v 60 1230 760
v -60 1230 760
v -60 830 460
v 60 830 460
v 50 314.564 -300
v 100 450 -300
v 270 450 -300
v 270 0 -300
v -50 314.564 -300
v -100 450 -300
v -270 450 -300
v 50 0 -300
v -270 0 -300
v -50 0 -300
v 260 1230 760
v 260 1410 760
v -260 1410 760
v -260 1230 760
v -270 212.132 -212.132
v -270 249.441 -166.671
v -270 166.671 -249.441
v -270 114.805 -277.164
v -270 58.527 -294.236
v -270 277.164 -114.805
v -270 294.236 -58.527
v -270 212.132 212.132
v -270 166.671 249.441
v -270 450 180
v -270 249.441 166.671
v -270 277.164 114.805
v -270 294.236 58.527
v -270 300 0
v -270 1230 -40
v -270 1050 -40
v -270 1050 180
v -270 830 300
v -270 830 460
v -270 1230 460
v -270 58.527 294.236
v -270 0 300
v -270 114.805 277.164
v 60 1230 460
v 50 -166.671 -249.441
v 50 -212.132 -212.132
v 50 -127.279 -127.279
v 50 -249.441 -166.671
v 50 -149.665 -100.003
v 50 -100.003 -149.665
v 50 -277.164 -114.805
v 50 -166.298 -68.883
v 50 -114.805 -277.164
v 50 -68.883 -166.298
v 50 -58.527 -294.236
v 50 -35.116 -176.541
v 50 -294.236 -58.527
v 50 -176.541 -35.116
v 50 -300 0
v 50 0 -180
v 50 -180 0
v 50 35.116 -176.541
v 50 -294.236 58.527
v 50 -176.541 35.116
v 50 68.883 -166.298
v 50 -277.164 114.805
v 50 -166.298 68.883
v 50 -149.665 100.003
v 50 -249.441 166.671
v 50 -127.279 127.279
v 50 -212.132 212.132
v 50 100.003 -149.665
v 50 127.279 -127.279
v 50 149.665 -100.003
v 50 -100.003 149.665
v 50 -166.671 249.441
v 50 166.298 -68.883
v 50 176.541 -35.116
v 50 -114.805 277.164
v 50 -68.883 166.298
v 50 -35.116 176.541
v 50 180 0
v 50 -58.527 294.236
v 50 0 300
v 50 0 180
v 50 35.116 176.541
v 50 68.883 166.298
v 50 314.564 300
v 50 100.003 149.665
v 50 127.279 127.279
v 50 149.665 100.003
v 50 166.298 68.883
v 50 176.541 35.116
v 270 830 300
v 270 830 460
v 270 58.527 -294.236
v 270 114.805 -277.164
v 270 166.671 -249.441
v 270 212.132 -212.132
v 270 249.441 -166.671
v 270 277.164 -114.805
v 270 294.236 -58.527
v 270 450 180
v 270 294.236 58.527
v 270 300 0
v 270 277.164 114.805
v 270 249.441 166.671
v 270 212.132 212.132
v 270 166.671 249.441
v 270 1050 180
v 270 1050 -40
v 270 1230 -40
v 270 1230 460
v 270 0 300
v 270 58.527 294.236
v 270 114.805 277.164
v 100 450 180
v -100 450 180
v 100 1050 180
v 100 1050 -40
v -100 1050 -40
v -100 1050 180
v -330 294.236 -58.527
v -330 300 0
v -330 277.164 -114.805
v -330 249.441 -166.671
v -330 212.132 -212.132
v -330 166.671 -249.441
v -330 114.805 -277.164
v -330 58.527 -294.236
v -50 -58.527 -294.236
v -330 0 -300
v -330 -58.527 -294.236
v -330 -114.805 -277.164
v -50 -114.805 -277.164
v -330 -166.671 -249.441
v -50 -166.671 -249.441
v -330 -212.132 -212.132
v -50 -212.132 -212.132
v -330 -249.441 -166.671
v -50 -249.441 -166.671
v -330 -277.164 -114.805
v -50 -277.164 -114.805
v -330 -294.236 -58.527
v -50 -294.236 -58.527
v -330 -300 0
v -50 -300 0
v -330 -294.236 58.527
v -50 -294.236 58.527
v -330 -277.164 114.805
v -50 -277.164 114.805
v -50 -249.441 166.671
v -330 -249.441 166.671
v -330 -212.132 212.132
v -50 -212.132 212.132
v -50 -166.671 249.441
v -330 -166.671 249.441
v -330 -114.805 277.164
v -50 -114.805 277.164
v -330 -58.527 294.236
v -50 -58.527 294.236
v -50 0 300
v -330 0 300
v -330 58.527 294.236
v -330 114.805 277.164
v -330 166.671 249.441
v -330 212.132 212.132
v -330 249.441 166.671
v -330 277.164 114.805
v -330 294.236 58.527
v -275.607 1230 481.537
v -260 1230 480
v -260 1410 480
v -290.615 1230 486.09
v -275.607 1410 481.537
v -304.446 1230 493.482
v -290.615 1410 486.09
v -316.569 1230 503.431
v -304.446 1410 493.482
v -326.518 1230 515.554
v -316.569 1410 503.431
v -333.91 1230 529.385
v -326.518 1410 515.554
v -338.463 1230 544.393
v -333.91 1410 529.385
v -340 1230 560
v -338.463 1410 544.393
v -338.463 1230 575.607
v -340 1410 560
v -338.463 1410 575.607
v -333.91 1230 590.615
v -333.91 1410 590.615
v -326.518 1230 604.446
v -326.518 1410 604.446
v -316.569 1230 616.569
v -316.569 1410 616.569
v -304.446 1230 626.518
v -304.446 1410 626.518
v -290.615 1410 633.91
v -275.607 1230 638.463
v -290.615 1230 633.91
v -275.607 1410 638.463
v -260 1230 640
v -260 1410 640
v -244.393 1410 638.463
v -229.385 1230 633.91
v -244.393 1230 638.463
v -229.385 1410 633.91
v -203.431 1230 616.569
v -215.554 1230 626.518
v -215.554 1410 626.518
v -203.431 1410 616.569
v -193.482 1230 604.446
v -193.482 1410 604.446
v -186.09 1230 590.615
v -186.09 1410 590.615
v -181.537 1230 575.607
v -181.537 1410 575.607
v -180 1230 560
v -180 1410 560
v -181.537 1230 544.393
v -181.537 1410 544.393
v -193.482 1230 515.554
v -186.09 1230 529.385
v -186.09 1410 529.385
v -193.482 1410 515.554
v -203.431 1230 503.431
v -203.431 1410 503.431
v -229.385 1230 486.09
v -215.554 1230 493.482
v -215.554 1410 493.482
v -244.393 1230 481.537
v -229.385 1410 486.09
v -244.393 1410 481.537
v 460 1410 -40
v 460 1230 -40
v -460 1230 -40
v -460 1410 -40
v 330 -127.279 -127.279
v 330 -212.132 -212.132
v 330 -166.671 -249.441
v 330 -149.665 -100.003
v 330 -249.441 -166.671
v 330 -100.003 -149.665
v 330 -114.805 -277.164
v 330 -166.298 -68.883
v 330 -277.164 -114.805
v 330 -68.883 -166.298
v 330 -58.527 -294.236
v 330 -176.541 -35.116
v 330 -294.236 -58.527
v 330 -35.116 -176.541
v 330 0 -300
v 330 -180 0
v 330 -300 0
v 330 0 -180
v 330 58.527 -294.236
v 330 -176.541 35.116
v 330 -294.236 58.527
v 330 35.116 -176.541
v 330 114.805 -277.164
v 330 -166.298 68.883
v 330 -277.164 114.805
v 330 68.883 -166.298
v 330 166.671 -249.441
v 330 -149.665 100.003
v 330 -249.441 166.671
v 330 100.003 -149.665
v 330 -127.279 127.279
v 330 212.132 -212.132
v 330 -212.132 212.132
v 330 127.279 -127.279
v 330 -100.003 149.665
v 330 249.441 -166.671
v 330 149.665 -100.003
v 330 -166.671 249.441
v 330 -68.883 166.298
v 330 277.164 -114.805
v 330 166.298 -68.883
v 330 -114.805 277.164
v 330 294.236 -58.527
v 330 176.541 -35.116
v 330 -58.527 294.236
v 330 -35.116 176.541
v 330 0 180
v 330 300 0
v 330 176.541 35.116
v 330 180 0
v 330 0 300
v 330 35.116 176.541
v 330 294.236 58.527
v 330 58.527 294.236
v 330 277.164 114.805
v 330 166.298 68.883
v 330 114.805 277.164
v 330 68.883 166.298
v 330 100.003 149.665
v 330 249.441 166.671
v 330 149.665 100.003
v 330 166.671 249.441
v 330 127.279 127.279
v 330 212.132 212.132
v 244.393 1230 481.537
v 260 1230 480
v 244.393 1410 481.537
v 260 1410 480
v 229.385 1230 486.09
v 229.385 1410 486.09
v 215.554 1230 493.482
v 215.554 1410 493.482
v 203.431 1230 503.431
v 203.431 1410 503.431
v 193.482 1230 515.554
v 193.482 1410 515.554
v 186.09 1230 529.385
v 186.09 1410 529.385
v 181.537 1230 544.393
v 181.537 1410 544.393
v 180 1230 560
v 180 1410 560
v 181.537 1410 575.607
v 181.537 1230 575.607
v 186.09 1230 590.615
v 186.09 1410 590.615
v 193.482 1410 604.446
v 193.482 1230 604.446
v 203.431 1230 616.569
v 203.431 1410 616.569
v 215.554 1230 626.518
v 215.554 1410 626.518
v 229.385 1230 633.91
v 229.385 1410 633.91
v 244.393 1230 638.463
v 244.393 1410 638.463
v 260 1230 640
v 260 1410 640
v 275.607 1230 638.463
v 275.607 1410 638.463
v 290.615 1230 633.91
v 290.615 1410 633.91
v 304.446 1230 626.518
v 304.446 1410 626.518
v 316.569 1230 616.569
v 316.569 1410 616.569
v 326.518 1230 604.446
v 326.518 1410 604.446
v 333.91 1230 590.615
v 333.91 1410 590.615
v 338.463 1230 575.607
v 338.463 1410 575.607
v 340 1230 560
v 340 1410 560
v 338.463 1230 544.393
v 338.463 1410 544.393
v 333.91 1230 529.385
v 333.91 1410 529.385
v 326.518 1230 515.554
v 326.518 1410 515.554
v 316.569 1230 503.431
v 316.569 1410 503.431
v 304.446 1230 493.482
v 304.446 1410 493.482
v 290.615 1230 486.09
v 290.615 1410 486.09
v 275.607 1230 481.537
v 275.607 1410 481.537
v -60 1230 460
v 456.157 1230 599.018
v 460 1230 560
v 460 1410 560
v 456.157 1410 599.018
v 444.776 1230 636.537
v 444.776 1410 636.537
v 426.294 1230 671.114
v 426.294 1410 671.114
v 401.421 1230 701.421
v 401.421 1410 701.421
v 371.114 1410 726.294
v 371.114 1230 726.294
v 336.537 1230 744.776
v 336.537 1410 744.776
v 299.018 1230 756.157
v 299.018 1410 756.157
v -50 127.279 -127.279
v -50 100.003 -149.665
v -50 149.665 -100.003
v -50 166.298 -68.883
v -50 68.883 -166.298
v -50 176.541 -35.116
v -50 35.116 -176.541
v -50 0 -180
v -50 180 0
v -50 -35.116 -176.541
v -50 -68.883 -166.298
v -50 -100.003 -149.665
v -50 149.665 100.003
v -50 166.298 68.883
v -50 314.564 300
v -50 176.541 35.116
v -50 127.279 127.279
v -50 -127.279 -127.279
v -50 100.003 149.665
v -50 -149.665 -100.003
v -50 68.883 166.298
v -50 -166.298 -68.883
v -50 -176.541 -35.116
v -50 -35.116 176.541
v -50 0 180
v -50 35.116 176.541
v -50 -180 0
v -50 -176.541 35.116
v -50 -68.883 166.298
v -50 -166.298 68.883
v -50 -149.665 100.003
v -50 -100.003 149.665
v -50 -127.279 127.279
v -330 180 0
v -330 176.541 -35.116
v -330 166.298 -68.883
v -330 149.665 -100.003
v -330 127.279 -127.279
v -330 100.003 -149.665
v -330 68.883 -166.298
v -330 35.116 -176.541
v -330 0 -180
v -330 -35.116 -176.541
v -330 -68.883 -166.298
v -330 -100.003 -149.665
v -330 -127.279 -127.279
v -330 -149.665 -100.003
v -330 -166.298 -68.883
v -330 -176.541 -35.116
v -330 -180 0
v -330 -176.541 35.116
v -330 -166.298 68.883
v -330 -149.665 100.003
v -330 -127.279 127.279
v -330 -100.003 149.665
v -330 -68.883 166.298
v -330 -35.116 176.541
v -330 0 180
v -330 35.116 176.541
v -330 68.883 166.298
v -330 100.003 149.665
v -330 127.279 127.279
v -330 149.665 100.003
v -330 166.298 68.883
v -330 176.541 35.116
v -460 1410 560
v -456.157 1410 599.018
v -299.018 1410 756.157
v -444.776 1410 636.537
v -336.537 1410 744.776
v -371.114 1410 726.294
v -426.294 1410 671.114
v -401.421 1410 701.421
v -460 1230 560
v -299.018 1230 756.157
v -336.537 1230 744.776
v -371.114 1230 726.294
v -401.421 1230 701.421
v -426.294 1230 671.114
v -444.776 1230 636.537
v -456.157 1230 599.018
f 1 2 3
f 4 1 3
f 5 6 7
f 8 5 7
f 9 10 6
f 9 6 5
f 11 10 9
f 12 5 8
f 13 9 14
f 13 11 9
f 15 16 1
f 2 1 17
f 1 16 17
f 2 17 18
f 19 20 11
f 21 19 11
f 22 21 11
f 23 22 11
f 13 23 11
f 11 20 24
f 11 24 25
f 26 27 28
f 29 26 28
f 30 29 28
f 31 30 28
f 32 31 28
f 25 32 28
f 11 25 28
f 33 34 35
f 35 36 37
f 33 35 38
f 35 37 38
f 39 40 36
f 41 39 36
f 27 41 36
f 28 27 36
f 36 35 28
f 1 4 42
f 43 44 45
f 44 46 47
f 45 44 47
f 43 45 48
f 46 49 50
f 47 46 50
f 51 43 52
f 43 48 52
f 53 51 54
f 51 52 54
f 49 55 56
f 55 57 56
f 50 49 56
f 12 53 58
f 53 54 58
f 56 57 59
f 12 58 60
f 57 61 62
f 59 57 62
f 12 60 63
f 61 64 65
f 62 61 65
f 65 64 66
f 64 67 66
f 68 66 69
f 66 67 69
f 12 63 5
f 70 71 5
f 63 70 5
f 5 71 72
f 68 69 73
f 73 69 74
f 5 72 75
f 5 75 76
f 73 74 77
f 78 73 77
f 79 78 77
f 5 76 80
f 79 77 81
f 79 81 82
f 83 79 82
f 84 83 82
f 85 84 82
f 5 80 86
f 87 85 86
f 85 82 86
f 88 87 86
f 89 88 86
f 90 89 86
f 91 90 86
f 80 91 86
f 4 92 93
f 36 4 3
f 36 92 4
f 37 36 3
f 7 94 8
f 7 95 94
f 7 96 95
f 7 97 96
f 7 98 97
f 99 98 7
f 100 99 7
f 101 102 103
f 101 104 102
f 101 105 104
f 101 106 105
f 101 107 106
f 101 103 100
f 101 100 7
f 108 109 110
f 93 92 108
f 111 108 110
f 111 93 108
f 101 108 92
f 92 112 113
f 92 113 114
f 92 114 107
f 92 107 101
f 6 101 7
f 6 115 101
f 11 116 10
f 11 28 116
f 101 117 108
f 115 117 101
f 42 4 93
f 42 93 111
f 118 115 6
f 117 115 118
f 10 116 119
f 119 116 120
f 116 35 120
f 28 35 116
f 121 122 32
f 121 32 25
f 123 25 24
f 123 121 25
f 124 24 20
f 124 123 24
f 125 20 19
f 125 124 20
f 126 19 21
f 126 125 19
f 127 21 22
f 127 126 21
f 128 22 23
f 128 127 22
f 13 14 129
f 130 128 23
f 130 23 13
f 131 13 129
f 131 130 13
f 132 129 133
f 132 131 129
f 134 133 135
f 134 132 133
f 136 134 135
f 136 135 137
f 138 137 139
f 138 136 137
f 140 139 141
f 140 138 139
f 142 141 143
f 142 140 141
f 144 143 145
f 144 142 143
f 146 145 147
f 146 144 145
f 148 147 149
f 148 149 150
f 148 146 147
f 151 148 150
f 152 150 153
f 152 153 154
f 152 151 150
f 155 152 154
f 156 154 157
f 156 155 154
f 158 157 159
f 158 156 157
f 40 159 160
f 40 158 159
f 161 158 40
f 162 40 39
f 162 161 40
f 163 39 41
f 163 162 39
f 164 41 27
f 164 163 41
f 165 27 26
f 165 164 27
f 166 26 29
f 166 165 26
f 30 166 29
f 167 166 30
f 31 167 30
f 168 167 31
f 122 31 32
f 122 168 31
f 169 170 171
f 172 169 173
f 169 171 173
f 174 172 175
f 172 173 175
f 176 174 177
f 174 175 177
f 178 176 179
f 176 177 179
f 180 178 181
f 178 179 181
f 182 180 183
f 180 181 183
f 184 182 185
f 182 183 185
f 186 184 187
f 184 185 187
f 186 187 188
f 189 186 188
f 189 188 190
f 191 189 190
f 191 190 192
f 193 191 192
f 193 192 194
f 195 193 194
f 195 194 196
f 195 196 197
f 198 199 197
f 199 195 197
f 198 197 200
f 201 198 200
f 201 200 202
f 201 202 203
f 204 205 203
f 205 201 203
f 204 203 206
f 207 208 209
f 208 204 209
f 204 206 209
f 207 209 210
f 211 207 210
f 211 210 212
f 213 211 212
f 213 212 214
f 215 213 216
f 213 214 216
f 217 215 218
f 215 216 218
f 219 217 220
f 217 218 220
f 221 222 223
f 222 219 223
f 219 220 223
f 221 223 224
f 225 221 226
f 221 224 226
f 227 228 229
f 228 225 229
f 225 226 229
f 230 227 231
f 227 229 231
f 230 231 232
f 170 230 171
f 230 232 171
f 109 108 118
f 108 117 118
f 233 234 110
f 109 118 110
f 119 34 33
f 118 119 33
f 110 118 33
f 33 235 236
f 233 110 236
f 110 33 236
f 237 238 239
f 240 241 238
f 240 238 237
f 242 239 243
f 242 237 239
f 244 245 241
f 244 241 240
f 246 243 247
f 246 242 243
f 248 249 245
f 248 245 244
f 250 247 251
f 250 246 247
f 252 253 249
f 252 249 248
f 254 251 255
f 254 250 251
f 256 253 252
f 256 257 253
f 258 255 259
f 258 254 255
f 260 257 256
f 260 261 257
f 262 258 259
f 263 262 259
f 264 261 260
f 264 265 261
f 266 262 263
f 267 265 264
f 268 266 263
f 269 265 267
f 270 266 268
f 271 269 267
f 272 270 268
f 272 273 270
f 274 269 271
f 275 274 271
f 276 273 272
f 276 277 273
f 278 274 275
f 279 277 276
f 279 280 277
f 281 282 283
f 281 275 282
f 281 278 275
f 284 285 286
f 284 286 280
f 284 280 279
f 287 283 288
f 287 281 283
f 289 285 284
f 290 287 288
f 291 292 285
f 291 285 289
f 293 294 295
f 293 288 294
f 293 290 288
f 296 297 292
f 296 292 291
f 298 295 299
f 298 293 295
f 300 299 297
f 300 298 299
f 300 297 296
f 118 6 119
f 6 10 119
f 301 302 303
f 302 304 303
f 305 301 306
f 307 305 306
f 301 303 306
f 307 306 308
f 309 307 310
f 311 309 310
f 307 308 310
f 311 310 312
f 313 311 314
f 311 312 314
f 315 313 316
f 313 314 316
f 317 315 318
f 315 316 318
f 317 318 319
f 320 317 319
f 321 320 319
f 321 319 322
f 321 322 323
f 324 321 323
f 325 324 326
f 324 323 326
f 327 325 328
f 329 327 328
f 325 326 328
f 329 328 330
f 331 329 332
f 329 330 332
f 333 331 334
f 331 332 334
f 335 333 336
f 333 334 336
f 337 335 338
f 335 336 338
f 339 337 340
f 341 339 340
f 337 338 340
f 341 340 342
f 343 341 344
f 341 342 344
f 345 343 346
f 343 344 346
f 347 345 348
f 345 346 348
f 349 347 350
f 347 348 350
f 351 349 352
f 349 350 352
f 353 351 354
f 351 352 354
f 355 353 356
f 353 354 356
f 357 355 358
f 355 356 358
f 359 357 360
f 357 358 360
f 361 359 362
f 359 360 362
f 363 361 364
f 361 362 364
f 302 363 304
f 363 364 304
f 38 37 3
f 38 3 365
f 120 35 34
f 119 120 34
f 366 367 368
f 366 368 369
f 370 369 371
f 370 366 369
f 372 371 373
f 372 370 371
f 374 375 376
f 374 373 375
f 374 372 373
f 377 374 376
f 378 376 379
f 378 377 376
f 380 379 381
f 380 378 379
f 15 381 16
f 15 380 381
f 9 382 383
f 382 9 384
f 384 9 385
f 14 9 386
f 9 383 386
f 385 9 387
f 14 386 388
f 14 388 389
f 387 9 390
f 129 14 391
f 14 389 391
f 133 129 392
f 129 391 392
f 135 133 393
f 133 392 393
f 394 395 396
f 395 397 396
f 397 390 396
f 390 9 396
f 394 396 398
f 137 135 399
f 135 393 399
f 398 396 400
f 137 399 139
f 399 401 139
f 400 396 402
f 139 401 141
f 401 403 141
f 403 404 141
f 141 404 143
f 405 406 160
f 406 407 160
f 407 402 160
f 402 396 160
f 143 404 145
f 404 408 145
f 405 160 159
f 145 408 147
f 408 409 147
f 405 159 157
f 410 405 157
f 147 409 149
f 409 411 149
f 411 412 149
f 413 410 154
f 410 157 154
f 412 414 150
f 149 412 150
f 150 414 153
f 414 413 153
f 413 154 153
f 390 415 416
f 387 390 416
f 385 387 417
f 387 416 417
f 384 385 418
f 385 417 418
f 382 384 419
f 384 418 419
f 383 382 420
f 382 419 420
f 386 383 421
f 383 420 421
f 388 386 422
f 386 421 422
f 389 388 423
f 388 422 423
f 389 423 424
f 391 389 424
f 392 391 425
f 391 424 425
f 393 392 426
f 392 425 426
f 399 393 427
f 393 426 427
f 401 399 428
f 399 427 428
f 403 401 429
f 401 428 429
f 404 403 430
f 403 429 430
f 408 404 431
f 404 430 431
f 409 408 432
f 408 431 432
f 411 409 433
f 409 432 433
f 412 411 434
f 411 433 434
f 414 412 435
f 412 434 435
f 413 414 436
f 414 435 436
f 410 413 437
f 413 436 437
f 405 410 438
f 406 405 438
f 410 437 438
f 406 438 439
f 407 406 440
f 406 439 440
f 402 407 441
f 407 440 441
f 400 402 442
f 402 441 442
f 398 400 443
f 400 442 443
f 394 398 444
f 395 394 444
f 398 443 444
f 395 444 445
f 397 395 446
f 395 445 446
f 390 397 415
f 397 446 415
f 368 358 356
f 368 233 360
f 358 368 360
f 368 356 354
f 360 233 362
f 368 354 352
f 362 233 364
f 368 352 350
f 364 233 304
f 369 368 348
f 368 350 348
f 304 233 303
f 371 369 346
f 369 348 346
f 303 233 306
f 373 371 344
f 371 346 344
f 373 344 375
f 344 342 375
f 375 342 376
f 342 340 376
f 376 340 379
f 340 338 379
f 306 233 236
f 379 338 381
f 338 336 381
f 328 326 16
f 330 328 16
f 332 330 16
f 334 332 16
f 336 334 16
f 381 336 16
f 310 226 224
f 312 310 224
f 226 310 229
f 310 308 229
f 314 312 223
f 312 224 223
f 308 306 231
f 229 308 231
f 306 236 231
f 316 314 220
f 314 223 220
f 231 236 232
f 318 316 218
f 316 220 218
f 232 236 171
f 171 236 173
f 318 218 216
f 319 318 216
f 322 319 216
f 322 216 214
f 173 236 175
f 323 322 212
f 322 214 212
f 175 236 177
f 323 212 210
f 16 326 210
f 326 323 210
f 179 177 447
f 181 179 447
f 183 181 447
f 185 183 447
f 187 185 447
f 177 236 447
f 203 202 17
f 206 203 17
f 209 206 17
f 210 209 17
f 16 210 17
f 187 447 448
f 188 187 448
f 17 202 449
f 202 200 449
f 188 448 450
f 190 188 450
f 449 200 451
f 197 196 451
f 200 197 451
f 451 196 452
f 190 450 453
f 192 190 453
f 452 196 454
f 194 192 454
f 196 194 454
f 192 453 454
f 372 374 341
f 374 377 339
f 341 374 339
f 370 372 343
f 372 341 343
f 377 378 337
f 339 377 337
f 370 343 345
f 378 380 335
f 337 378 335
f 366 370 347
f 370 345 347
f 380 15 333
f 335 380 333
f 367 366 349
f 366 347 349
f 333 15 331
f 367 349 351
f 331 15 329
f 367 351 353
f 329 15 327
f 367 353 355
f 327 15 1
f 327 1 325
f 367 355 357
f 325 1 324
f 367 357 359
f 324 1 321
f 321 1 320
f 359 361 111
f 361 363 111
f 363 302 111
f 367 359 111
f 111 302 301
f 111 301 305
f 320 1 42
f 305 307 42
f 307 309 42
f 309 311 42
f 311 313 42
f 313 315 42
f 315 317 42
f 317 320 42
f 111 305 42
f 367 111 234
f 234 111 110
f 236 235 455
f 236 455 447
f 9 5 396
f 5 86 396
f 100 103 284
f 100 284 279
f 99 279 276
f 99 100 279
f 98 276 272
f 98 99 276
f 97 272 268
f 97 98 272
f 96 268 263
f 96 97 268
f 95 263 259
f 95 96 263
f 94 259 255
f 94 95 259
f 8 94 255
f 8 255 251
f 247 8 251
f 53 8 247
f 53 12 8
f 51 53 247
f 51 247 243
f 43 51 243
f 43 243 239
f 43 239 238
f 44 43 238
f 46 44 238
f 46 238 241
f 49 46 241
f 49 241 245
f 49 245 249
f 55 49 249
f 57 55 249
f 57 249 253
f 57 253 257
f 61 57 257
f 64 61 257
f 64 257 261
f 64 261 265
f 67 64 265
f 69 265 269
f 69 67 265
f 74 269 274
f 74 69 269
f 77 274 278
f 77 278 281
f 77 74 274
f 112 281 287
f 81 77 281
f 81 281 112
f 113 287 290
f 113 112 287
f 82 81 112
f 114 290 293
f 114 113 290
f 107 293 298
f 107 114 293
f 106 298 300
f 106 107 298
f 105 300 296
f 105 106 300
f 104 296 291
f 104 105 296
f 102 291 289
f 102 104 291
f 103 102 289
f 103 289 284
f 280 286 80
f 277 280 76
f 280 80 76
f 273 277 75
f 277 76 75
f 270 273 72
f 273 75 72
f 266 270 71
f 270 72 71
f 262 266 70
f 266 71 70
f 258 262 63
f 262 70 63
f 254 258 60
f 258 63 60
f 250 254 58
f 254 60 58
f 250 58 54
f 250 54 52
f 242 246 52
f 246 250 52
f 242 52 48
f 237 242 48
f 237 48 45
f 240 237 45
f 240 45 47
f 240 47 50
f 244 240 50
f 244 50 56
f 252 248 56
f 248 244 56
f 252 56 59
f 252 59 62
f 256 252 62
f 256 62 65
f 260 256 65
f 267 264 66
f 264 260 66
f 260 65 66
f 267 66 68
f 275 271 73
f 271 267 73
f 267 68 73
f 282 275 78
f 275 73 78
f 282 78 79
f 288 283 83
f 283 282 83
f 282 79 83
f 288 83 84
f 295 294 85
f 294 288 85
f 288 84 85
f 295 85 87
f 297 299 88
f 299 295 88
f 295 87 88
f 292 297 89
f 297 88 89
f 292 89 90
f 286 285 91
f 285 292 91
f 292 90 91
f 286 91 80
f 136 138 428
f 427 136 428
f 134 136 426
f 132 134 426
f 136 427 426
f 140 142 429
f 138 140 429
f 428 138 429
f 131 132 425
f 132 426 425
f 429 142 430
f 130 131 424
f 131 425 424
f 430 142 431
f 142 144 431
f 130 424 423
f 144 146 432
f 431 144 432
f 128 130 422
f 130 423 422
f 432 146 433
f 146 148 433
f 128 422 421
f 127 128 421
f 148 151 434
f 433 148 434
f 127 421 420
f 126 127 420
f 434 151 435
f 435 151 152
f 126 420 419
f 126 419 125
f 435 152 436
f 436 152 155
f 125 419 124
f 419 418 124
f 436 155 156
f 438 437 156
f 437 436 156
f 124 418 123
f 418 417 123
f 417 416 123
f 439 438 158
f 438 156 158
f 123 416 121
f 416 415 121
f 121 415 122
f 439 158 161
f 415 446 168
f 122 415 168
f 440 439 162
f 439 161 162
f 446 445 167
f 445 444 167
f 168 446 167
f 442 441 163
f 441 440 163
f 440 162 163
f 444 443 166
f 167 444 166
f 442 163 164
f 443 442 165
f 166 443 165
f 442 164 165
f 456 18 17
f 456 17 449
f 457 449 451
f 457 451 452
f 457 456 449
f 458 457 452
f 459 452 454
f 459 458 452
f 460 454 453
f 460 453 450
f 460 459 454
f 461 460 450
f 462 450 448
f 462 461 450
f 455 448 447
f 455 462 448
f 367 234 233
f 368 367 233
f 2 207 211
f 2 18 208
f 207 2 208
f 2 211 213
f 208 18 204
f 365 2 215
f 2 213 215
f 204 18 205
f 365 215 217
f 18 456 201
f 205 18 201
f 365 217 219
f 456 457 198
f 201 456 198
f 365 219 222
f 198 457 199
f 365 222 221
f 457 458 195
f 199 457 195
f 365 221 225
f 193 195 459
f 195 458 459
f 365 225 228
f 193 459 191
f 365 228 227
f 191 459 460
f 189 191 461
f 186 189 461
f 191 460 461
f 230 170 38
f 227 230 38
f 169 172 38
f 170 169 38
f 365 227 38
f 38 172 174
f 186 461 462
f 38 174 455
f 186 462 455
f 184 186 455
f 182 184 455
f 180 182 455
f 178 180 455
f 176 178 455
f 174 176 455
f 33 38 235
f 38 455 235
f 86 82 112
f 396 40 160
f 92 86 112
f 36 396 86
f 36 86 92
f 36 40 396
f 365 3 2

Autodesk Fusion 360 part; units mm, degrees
sketch "Sketch1" plane through (0, 0, 0) normal (1, 0, 0) x (0, 1, 0)
  circle A0 centre (0, 0) radius 180
  circle A1 centre (0, 0) radius 300
  line L0 (0, 300) -> (830, 300)
  line L1 (830, 300) -> (830, 460)
  line L2 (830, 460) -> (1230, 460)
  line L3 (1230, 460) -> (1230, -40)
  line L4 (1230, -40) -> (1050, -40)
  line L5 (1050, 180) -> (450, 180)
  line L6 (450, 180) -> (450, -300)
  line L7 (450, -300) -> (0, -300)
  line L8 (1050, 180) -> (1050, -40)
  line L9 (1230, -40) -> (1410, -40)
  line L10 (1410, -40) -> (1410, 760)
  line L11 (1410, 760) -> (1230, 760)
  line L12 (1230, 760) -> (1230, -40)
  line L13 (1230, 760) -> (830, 460)
  line L14 (450, -300) -> (1050, -40)
  dimension "d1" = 360
  dimension "d2" = 600
  dimension "d3" = 800
  dimension "d4" = 180
  dimension "d5" = 180
  dimension "d6" = 450
  dimension "d7" = 600
  dimension "d8" = 160
  dimension "d9" = 120
  dimension "d10" = 220
  dimension "d11" = 400
  dimension "d12" = 480
extrude "Extrude1" add sketch "Sketch1" along normal mid plane 660 contours A1
extrude "Extrude2" add sketch "Sketch1" along normal mid plane 540 contours A1 L0 L1 L2 L3 L4 L5 L6 L7 L8 L12
extrude "Extrude3" add sketch "Sketch1" along normal mid plane 120 contours L2 L12 L13
extrude "Extrude4" add sketch "Sketch1" along normal mid plane 920 contours L3 L9 L10 L11 L12
extrude "Extrude5" add sketch "Sketch1" along normal mid plane 200 contours L5 L6 L8 L14
fillet "Fillet1" radius 200 2 edges at (460, 1320, 760) (-460, 1320, 760)
sketch "Sketch2" plane through (0, 0, 300) normal (0, 0, 1) x (-1, 0, 0)
  line L0 (270, 0) -> (-270, 0)
  line L1 (-270, 0) -> (-270, -830)
  line L2 (-270, -830) -> (270, -830)
  line L3 (270, -830) -> (270, 0)
  line L4 (50, 314.5637) -> (-50, 314.5637)
  line L5 (-50, 314.5637) -> (-50, -314.5637)
  line L6 (-50, -314.5637) -> (50, -314.5637)
  line L7 (50, -314.5637) -> (50, 314.5637)
  line L8 (50, 314.5637) -> (-50, -314.5637) construction
  line L9 (-50, 314.5637) -> (50, -314.5637) construction
  point P0 (330, 300)
  point P1 (-330, 300)
  dimension "d25" = 100
  dimension "d26" = 280
  dimension "d27" = 280
extrude "Extrude6" cut sketch "Sketch2" against normal blind 1200 contours L0 L5 L6 L7 | L0 L4 L5 L7
hole "Hole1" at (260, 1230, 560) direction (0, 1, 0) diameter 160 end through all
mirror "Mirror1" about plane through (0, 0, 0) normal (1, 0, 0) of "Hole1"
